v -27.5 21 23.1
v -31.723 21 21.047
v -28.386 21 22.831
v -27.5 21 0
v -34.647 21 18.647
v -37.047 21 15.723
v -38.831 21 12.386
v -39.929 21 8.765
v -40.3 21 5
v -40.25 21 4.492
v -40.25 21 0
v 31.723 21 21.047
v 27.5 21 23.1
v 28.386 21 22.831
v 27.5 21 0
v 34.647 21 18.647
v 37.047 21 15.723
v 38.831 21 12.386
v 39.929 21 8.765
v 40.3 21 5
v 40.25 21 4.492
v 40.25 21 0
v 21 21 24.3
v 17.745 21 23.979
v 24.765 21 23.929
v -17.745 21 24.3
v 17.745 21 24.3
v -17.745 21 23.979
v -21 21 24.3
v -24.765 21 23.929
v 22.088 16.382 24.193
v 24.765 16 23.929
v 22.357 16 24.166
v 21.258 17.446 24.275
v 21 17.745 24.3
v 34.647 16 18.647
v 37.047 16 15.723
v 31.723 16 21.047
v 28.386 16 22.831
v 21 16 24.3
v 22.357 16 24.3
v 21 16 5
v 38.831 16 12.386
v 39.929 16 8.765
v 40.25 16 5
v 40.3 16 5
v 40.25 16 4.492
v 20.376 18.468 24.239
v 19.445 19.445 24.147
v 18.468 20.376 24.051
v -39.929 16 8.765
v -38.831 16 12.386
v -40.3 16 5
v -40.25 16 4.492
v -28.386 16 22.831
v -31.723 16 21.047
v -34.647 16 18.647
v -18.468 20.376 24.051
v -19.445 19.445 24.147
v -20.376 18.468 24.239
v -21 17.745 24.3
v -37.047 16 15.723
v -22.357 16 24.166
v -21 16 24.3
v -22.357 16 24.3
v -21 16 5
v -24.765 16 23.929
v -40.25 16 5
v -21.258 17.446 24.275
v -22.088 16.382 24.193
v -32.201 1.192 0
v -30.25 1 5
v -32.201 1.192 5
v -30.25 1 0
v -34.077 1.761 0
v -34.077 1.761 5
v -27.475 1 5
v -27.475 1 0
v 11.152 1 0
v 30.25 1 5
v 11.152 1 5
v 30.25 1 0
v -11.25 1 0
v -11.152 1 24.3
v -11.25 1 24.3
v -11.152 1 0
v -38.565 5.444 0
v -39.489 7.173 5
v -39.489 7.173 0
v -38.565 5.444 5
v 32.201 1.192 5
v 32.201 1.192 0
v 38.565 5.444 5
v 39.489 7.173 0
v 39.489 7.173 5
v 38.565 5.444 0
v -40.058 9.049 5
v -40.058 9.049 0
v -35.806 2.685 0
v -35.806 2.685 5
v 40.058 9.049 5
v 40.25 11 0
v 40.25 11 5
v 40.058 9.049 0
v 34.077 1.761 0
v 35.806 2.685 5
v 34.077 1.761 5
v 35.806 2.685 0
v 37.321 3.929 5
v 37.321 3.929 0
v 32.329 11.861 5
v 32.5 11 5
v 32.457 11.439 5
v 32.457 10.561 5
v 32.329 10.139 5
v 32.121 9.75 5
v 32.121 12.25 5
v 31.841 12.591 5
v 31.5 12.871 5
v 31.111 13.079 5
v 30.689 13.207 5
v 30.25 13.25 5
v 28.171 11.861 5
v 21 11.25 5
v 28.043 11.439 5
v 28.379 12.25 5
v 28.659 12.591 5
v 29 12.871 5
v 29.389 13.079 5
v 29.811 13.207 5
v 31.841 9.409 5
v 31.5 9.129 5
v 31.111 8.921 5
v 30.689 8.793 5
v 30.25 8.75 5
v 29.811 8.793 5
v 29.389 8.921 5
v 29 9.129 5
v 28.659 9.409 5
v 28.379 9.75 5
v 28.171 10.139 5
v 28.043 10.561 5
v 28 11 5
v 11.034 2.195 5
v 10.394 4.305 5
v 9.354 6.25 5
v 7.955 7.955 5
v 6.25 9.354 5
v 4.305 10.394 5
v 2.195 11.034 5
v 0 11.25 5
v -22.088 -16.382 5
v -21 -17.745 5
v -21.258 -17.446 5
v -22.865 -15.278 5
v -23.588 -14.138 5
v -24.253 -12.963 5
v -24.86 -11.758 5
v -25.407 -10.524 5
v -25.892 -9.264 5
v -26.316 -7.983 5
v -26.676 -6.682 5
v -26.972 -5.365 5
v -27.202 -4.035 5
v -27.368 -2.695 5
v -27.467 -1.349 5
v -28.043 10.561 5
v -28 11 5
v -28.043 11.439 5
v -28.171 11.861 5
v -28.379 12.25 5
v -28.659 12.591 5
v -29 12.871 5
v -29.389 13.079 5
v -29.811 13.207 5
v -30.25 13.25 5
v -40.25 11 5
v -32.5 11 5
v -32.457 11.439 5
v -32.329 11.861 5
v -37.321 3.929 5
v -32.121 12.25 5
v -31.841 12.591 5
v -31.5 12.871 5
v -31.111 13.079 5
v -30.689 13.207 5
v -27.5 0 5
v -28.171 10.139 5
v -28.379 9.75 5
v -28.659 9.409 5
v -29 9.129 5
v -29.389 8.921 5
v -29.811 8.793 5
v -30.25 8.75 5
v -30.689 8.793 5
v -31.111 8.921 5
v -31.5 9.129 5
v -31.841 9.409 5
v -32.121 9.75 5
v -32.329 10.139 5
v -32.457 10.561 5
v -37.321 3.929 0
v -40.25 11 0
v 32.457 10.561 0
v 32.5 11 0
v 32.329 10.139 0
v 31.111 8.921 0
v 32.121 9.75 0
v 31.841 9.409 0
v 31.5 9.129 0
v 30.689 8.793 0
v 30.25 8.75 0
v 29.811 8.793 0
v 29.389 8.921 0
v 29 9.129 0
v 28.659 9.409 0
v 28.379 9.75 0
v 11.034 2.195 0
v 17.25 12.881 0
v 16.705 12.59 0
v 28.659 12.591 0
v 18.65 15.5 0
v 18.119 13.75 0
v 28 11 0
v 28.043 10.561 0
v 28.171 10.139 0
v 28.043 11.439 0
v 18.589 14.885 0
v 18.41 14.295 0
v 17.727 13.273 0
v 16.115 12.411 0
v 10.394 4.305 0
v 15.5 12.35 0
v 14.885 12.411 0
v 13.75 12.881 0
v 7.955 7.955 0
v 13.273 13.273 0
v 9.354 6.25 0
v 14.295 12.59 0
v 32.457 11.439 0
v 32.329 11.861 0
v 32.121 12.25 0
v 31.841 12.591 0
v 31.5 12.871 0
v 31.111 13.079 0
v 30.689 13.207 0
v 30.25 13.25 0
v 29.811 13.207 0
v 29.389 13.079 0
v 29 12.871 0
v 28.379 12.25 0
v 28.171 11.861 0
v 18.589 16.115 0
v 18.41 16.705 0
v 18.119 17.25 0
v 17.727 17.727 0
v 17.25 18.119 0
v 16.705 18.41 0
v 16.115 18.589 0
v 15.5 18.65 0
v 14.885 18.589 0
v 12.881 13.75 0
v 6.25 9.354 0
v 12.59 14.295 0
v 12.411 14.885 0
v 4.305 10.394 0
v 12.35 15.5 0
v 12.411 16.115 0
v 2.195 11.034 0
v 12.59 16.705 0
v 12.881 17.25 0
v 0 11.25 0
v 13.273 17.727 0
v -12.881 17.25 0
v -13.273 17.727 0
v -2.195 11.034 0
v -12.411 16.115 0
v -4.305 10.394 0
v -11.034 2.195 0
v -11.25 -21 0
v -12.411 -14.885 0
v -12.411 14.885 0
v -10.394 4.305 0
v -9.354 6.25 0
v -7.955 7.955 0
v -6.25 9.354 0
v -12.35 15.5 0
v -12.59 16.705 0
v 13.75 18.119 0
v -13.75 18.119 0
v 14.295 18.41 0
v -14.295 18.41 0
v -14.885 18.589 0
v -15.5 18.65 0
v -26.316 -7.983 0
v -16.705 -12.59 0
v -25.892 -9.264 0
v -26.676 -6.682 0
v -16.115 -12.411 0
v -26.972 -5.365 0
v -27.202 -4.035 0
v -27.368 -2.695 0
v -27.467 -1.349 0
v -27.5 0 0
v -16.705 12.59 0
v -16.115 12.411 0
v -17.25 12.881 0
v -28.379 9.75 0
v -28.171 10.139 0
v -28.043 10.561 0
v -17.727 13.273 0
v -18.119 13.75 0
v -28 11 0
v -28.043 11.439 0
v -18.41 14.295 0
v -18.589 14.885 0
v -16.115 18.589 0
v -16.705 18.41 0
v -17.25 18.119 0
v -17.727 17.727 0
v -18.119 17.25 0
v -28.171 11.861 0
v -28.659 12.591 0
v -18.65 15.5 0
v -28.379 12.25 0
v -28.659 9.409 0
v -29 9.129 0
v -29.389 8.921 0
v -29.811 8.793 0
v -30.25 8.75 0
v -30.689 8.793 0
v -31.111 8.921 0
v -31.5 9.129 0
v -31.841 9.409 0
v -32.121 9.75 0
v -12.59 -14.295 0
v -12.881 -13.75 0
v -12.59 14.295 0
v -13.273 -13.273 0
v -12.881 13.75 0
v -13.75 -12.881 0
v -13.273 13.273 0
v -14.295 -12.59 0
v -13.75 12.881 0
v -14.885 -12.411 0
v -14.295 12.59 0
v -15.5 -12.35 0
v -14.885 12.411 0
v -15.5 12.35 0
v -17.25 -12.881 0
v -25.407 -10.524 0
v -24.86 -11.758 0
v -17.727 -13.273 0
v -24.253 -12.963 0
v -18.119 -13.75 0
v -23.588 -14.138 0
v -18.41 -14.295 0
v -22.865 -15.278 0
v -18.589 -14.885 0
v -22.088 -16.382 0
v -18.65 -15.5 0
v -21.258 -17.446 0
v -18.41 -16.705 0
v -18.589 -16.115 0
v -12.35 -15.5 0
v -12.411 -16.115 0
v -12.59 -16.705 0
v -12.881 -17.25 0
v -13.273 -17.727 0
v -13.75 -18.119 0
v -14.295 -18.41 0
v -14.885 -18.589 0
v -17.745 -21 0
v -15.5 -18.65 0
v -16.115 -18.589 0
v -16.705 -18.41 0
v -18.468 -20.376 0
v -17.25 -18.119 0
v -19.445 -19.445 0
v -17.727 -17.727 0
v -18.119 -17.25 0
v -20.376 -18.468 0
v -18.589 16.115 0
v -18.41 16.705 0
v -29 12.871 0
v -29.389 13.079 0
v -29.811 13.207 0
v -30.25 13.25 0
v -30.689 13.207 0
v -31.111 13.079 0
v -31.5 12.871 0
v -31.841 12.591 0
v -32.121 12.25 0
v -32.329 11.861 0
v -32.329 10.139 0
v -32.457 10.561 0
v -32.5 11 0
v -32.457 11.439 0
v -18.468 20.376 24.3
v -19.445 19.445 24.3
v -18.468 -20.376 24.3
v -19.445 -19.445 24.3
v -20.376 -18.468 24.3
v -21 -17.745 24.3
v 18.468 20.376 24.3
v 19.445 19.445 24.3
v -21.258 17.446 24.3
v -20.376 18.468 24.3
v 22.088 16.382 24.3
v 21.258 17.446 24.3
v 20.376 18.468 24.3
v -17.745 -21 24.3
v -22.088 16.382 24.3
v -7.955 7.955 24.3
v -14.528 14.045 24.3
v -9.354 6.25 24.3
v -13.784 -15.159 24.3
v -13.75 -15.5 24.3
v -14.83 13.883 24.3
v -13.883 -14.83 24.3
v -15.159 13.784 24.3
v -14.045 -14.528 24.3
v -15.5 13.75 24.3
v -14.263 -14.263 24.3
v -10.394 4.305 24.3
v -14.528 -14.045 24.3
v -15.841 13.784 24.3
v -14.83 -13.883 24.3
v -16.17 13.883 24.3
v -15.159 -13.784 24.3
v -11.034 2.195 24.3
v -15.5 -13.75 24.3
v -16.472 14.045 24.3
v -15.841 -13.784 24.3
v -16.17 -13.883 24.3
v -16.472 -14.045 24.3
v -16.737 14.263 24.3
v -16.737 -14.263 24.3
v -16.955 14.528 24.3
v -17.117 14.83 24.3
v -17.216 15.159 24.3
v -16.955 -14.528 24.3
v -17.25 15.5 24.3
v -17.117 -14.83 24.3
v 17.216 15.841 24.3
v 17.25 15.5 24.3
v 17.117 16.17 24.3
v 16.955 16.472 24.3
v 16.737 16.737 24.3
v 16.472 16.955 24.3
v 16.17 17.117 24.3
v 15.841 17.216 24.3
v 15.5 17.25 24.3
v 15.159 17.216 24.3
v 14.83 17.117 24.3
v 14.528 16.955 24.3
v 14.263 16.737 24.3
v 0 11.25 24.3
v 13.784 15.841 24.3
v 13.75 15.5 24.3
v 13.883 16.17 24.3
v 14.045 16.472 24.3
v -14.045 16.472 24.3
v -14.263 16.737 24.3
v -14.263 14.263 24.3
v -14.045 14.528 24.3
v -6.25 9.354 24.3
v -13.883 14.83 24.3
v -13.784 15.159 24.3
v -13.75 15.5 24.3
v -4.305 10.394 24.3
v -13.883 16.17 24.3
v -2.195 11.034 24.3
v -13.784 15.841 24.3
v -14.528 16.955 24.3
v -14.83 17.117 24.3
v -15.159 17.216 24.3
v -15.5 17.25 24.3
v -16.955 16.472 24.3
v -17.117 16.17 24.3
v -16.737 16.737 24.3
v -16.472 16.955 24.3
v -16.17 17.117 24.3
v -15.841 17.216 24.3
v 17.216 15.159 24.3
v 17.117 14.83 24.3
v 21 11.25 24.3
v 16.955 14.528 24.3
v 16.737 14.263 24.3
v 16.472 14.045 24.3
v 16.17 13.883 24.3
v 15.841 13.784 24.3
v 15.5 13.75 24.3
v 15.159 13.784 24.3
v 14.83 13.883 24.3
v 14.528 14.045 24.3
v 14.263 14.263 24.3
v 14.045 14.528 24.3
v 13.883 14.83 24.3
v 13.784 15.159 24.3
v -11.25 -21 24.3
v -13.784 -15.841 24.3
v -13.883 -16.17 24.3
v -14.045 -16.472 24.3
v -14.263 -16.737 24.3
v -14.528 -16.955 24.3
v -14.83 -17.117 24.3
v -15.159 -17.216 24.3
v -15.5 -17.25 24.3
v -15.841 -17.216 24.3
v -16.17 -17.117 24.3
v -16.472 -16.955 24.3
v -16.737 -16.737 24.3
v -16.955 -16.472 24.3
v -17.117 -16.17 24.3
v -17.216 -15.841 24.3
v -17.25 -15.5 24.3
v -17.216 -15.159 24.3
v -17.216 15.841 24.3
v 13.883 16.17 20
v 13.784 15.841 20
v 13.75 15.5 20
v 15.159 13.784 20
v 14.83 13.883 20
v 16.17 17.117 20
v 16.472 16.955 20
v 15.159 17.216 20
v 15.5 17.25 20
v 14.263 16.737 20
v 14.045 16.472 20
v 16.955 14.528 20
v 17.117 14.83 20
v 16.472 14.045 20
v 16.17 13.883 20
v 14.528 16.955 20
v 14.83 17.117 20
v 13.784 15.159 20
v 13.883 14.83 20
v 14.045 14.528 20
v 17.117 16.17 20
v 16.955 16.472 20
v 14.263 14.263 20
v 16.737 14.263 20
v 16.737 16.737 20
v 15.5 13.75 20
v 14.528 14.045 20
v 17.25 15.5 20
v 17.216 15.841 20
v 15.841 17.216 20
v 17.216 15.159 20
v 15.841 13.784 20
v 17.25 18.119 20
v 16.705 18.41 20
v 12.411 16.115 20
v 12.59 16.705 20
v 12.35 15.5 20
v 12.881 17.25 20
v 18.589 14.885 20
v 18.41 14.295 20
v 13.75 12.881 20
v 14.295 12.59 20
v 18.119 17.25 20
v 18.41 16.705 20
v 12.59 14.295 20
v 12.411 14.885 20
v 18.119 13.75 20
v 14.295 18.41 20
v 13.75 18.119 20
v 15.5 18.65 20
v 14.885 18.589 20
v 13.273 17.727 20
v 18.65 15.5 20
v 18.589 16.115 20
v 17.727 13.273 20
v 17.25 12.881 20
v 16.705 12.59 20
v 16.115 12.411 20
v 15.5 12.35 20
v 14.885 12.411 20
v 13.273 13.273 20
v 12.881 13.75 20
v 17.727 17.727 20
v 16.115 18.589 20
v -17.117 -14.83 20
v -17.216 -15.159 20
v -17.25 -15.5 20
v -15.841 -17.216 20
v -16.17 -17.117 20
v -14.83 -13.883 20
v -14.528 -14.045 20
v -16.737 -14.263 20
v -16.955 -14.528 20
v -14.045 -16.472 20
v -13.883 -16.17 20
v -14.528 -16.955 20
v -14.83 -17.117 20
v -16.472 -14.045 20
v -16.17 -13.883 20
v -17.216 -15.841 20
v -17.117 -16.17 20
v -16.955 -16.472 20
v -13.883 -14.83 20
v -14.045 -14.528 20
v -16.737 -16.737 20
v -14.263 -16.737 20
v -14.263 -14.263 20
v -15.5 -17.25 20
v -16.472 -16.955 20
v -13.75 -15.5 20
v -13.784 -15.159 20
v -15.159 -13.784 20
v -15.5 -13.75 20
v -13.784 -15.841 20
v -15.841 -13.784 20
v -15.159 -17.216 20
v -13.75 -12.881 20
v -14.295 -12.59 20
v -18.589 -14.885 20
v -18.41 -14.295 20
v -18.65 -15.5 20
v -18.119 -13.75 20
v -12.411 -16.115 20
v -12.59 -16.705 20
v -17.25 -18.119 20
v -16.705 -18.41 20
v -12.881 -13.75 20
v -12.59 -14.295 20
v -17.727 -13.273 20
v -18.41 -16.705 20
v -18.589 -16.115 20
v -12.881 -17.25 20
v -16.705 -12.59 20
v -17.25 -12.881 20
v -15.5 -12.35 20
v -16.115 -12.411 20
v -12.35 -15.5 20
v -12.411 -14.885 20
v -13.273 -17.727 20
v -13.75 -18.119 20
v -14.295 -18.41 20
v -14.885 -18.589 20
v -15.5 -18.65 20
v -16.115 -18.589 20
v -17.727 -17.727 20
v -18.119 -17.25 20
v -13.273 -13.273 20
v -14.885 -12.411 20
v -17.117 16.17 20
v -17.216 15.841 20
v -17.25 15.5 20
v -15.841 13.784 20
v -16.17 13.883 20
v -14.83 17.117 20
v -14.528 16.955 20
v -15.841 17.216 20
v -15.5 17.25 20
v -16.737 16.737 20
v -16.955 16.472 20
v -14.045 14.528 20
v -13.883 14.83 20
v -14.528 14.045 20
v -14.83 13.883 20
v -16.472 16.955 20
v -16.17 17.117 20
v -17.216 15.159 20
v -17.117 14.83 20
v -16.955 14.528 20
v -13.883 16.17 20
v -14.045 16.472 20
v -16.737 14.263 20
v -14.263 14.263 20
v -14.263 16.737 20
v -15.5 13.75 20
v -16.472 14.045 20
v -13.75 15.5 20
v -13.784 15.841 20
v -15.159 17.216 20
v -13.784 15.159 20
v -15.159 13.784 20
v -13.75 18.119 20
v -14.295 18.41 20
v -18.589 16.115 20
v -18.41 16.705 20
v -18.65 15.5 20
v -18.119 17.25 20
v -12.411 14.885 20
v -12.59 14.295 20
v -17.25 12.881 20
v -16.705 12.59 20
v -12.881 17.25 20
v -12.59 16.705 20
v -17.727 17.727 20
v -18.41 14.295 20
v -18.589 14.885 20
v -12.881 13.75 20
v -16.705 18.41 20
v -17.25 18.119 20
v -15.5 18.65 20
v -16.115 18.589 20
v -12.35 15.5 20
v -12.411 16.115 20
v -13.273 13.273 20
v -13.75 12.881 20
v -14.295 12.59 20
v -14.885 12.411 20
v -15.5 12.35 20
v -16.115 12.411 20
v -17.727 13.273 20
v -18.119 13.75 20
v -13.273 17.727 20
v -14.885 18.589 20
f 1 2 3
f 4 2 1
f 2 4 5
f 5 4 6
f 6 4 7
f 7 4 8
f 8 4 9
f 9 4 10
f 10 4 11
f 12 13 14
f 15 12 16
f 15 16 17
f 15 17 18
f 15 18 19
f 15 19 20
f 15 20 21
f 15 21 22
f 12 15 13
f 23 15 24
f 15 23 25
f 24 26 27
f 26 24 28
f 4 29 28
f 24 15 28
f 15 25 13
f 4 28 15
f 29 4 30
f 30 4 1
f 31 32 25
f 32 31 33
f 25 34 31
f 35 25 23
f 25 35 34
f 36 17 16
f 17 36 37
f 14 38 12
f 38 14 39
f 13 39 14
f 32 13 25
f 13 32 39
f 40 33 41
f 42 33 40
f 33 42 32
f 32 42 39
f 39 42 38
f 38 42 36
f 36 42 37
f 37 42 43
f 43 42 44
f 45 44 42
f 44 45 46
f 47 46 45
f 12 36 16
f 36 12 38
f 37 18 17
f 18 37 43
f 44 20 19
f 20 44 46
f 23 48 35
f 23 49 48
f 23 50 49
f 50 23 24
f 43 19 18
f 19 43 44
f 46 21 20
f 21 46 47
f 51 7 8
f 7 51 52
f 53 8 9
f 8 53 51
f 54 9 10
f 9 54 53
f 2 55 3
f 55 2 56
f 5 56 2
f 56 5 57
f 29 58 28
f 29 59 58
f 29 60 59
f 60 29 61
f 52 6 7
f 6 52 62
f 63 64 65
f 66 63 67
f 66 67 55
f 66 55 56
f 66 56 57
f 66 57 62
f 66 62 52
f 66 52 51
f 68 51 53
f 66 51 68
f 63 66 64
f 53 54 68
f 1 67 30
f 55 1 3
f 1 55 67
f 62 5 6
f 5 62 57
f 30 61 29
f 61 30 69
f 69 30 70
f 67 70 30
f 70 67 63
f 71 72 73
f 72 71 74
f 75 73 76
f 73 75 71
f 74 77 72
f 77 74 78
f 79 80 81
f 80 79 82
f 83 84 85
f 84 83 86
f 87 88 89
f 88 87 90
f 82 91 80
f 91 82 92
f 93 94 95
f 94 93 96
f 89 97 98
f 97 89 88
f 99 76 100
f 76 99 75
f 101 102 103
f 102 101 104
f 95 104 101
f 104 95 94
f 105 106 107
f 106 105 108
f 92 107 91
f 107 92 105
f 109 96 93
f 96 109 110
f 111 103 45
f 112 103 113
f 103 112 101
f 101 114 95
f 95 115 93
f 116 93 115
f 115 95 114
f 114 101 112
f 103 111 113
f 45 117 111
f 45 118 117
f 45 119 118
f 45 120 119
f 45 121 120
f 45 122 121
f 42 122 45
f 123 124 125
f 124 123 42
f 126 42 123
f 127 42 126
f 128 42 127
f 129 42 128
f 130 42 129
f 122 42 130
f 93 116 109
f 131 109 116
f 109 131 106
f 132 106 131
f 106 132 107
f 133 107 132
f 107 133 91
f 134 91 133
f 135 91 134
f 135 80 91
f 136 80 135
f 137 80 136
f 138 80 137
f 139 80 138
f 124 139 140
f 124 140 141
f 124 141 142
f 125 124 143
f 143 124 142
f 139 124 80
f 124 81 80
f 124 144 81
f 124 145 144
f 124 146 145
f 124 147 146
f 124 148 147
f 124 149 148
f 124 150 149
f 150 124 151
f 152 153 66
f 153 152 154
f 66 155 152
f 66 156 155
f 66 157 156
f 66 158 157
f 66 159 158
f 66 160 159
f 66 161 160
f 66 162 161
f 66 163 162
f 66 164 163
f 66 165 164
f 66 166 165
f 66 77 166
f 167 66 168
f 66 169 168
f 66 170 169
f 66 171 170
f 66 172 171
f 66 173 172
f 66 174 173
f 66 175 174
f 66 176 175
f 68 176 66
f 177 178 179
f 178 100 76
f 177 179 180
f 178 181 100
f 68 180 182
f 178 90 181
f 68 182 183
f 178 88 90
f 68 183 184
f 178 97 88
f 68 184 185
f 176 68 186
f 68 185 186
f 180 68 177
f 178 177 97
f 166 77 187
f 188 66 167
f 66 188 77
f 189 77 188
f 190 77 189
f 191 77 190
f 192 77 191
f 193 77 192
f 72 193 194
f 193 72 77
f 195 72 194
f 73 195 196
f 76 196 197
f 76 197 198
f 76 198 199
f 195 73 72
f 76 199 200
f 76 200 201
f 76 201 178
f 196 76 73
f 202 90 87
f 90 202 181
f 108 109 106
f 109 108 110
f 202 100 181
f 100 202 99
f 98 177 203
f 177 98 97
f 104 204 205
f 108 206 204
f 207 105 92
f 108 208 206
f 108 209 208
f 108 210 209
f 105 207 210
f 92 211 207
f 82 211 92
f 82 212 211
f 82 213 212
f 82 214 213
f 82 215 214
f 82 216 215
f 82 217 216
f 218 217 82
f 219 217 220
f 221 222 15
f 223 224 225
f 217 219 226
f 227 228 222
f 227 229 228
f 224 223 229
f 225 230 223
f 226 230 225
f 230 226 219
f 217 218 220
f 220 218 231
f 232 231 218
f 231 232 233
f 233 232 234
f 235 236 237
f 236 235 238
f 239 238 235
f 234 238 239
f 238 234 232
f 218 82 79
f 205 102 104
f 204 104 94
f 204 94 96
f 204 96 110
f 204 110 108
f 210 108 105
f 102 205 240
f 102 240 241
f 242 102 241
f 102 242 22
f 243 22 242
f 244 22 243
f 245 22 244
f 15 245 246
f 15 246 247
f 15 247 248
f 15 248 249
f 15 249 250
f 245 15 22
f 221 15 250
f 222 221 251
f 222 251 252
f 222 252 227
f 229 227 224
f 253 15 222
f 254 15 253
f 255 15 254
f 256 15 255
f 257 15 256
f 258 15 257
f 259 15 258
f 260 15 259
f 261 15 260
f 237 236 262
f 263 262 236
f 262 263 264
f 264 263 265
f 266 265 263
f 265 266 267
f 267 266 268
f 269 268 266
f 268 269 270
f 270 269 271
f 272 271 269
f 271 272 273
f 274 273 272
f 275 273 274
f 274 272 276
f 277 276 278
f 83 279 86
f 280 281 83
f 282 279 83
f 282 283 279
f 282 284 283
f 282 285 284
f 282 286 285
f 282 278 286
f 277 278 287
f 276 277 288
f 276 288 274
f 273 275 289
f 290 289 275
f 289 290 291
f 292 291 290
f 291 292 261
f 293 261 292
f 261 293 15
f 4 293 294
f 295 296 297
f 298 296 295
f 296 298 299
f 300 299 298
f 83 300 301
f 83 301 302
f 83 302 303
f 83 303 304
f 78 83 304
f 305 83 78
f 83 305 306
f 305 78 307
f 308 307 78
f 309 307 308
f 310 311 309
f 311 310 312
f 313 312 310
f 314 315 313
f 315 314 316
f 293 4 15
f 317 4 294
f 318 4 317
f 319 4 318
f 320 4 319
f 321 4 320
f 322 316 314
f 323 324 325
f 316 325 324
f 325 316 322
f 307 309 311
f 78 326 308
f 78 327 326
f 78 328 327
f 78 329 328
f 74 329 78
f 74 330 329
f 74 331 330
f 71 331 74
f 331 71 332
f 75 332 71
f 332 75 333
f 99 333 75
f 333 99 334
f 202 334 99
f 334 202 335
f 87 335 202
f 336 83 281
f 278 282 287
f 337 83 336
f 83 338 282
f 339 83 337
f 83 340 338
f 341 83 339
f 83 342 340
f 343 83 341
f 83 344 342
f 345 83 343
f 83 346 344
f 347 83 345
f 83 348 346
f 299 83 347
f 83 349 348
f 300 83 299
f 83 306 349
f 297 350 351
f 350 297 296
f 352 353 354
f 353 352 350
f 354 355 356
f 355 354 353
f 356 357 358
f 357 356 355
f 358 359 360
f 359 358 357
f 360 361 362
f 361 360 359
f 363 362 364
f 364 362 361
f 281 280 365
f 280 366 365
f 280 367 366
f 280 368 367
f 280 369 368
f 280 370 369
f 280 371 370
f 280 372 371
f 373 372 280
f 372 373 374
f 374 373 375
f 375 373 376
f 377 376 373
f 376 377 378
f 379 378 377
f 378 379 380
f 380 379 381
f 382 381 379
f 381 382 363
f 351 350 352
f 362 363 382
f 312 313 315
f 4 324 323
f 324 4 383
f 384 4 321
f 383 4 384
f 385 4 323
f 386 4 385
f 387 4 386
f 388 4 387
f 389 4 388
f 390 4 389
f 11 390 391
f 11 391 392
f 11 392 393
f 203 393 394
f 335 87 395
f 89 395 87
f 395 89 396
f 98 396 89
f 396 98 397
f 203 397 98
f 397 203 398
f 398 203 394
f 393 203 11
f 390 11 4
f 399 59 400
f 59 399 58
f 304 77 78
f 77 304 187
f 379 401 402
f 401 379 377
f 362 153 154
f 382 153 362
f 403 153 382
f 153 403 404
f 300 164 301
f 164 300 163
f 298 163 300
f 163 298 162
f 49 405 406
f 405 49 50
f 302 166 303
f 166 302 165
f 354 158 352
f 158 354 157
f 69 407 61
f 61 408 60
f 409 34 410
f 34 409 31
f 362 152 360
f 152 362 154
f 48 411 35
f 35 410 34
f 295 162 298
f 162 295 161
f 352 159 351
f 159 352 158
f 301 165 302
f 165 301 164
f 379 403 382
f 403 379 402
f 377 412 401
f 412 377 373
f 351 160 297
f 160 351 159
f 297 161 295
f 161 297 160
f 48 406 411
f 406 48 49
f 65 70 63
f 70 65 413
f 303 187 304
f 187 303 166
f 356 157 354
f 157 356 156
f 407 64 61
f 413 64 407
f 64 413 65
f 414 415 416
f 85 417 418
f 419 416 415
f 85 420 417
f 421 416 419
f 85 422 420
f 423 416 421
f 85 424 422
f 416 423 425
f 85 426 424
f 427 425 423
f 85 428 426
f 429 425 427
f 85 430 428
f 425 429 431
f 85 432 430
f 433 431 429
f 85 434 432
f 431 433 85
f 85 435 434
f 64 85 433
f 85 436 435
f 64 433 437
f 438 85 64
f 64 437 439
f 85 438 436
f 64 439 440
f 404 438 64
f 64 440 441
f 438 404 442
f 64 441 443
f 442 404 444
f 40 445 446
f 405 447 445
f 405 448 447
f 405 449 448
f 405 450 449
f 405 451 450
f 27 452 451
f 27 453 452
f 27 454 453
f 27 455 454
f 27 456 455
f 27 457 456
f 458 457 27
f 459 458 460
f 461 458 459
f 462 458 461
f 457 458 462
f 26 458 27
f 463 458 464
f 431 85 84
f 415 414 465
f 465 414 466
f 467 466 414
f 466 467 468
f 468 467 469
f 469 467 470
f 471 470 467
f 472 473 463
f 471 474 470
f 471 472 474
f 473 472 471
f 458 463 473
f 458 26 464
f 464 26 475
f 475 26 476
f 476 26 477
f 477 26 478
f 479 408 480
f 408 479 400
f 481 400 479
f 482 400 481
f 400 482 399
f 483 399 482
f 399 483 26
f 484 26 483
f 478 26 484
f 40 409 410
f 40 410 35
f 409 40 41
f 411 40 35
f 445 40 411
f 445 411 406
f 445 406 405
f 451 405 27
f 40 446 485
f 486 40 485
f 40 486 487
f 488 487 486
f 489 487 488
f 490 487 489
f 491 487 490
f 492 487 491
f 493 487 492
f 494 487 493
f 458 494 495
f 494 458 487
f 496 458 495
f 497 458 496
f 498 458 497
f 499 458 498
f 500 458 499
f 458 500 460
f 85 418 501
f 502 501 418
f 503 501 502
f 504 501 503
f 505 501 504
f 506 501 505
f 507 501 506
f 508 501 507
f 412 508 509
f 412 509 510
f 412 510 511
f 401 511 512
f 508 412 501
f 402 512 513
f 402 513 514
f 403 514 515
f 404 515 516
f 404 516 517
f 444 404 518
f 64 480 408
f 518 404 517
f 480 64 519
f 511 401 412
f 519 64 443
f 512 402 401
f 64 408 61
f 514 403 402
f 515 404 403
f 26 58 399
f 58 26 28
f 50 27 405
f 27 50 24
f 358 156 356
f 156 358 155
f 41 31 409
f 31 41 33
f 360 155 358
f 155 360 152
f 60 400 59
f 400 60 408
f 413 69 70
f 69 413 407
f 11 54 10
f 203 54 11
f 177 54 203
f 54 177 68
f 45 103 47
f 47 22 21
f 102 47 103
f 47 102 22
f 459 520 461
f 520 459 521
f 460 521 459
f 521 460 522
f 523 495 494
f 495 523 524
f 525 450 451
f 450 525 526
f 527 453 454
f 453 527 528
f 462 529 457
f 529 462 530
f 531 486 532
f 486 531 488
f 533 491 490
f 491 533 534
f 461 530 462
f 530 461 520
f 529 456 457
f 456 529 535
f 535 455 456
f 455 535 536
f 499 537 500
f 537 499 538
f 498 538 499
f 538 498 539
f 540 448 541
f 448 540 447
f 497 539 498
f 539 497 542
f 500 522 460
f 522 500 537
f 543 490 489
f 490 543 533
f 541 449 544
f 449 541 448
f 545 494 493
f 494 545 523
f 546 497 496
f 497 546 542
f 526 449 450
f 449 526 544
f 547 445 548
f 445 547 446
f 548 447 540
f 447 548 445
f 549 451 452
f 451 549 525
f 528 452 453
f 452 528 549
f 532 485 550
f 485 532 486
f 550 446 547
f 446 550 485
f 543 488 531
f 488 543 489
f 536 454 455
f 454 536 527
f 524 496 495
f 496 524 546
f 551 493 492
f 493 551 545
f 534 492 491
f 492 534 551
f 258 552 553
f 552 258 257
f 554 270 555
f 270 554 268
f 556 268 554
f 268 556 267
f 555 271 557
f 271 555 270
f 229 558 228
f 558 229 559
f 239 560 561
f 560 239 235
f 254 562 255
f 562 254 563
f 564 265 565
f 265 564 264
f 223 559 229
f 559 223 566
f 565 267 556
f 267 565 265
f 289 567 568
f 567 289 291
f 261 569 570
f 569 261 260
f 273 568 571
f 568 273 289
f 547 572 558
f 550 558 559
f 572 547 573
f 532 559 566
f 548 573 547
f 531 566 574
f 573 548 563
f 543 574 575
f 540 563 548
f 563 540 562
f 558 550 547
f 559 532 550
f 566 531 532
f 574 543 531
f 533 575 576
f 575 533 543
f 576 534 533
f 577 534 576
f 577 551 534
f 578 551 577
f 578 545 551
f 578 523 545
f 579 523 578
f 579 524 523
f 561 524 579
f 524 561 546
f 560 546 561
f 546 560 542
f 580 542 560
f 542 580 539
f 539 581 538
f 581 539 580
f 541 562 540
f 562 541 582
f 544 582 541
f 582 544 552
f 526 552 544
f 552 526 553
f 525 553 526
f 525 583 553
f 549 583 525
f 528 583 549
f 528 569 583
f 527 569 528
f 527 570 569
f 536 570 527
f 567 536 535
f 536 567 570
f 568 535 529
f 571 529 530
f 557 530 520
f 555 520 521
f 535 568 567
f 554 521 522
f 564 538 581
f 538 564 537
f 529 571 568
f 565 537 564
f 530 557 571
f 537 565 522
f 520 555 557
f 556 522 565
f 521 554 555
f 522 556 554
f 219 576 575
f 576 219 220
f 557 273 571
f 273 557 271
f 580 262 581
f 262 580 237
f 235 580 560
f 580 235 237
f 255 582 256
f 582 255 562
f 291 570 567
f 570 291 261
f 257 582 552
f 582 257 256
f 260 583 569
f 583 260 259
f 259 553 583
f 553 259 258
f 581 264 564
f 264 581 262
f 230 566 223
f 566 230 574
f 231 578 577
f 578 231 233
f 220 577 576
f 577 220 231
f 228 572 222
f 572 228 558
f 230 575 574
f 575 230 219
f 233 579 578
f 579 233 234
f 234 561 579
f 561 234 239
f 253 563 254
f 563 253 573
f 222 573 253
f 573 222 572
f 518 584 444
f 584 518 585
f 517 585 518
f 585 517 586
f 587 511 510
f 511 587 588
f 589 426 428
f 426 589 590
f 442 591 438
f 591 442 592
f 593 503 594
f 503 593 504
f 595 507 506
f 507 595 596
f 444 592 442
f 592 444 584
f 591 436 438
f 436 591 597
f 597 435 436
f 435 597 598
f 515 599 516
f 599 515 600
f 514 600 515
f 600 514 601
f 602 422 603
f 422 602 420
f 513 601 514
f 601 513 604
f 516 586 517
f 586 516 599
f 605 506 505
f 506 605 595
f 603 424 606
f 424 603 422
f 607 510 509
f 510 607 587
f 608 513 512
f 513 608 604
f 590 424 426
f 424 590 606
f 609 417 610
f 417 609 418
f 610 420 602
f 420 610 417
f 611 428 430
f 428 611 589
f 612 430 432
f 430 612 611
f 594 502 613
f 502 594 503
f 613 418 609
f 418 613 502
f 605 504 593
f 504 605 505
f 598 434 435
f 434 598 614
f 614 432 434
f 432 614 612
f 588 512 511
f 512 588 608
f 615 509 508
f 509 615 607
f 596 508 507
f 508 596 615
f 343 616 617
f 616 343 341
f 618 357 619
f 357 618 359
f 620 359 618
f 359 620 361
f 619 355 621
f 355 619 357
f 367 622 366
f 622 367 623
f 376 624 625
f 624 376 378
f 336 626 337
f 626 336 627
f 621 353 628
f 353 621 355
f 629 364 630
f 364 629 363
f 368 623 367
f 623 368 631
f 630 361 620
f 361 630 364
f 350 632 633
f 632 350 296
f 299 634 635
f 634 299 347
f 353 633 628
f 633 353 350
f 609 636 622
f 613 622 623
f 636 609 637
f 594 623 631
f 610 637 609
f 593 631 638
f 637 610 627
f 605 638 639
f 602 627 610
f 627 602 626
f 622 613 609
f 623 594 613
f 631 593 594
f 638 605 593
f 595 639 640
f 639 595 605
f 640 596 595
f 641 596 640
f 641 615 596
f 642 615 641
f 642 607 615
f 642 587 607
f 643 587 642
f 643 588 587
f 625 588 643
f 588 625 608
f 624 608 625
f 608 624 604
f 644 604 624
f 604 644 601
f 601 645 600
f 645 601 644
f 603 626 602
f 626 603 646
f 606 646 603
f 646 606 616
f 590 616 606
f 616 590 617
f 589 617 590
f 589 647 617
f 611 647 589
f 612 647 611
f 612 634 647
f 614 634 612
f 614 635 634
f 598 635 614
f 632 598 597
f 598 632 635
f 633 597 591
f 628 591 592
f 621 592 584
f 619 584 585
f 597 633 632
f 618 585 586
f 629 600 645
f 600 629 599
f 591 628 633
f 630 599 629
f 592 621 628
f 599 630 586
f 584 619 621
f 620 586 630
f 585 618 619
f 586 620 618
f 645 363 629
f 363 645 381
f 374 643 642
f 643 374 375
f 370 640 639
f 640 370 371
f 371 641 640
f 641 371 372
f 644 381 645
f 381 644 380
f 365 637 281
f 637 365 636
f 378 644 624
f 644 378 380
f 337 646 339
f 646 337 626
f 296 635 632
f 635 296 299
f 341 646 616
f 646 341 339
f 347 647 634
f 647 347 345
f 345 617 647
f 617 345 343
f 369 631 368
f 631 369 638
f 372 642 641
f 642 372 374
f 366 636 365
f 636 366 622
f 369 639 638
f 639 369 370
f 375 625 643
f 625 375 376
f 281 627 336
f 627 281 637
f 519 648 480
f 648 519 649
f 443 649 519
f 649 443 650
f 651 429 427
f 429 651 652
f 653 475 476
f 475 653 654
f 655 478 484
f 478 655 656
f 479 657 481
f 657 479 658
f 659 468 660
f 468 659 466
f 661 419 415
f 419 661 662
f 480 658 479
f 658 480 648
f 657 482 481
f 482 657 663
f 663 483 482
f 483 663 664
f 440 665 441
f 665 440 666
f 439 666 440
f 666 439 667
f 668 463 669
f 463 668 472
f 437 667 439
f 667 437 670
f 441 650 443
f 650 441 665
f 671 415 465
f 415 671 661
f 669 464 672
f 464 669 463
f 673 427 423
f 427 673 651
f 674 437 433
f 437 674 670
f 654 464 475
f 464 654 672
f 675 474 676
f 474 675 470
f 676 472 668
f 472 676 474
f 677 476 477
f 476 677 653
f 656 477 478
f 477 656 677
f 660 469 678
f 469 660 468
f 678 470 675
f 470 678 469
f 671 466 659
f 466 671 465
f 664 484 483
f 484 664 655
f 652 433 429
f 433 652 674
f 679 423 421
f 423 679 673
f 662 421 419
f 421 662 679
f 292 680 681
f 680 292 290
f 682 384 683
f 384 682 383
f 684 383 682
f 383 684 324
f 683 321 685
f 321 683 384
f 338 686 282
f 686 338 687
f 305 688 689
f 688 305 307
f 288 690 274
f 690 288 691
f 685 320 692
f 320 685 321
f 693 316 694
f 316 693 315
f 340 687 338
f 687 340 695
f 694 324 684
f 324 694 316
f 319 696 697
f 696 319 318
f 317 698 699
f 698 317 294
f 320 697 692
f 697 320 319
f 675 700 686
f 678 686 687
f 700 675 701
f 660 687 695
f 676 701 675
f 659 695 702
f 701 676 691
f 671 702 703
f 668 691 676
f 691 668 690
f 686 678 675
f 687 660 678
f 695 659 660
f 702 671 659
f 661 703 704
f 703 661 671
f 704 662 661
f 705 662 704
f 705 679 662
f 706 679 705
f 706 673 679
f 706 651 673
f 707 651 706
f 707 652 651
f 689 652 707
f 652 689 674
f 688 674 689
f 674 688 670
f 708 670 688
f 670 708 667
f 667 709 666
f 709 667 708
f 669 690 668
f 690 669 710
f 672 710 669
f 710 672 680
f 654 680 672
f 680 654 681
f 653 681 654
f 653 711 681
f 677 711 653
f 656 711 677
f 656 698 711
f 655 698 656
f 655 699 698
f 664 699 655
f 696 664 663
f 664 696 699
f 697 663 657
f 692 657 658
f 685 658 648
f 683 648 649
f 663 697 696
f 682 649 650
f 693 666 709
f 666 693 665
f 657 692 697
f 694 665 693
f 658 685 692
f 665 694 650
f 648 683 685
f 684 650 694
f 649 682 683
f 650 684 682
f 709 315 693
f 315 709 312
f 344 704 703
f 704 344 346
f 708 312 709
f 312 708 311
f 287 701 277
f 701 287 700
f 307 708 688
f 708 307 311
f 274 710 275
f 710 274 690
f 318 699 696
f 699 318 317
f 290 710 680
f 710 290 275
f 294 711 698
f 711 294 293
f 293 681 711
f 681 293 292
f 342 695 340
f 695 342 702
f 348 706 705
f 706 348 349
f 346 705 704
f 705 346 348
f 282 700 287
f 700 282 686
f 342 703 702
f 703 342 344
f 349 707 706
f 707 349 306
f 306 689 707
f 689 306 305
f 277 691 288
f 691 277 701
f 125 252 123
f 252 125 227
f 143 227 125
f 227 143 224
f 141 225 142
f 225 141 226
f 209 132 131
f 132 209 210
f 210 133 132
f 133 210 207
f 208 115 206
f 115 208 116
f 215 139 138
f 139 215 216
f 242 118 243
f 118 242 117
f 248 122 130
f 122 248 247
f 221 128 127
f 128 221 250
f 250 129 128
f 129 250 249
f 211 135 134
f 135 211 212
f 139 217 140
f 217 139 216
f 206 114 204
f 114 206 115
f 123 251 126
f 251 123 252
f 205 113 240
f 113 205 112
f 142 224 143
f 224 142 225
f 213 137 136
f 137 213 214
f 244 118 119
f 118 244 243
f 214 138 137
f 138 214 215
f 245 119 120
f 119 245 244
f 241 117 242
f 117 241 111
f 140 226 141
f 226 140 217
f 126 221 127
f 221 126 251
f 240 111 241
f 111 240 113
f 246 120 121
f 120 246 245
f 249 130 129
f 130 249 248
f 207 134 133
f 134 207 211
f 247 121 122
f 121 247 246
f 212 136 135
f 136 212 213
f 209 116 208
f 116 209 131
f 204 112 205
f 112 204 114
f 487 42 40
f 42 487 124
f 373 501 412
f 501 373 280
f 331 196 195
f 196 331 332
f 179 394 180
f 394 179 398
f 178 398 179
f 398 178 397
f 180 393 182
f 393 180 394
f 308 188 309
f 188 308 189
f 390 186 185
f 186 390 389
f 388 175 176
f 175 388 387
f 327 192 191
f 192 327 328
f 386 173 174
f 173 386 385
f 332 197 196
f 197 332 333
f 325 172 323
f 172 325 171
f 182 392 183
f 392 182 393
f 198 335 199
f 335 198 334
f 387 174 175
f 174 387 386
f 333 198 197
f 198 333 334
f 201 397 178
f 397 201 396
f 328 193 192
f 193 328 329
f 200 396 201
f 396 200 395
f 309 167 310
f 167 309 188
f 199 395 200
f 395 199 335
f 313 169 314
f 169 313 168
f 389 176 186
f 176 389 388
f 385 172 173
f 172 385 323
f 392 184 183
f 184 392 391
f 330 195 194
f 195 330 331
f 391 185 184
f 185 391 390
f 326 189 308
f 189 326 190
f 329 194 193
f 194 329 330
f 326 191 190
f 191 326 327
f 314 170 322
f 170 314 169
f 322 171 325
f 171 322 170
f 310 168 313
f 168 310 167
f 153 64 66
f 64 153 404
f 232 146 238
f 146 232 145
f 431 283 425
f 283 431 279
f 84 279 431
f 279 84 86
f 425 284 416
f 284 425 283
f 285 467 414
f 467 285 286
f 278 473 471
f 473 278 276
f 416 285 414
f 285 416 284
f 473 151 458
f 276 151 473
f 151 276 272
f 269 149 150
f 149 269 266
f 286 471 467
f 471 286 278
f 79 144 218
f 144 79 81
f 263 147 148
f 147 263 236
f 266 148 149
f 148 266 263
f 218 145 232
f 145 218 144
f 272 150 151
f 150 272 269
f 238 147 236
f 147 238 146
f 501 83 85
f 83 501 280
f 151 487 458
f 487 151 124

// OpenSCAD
res = 32;

module Xmotor_holder() {
    render(convexity=6) difference() {
        union() {
            hull() {
                for(i=[-1, 1]) {
                    translate([i*30.25, 11, 0]) cylinder(d=20, h=5, $fn=res);
                }
            }
            cylinder(d=55, h=24.3, $fn=4*res);
            translate([-40.25, 11, 0]) cube([80.5, 10, 5]);
            for(i=[-1, 1]) {
                translate([i*21, 21, 5]) rotate([90, 0, 0]) cylinder(d=38.6, h=5, $fn=res);
            }
        }
        translate([0, 0, -1]) cylinder(d=22.5, h=41, $fn=res);
        for(i=[-1, 1]) {
            translate([i*30.25, 11, -1]) cylinder(d=4.5, h=7, $fn=res);
            for(j=[-1, 1]) {
                translate([i*15.5, j*15.5, -1]) {
                    cylinder(d=3.5, h=41, $fn=res);
                    cylinder(d=6.3, h=21, $fn=res);
                }
            }
            translate([i*48.5, -6.5-5, 18]) cube([55, 55, 26], center=true);
            translate([0, i*48.5, 12]) cube([55, 55, 26], center=true);
        }
        translate([-50+11.25, -49, -1]) cube([50, 50, 50]);
        translate([-50, -49+10.25, 5]) cube([50, 50, 50]);
        translate([-100, -100, -50]) cube([200, 200, 50]);
    }
}

module Ymotor_holder() {
    mirror([1,0,0]) Xmotor_holder();
}

module Zmotor_holder() {
    render(convexity=6) difference() {
        union() {
            hull() {
                for(i=[-1, 1]) {
                    translate([i*30.25, 11, 0]) cylinder(d=20, h=5, $fn=res);
                }
            }
            cylinder(d=55, h=24.3+0.5, $fn=4*res);
            translate([-40.25, 11, 0]) cube([80.5, 10, 5]);
            for(i=[-1, 1]) {
                translate([i*21, 21, 5]) rotate([90, 0, 0]) cylinder(d=38.6, h=5, $fn=res);
            }
        }
        translate([0, 0, -1]) cylinder(d=22.5, h=41, $fn=res);
        for(i=[-1, 1]) {
            translate([i*30.25, 11, -1]) cylinder(d=4.5, h=7, $fn=res);
            for(j=[-1, 1]) {
                translate([i*15.5, j*15.5, -1]) {
                    cylinder(d=3.5, h=41, $fn=res);
                    cylinder(d=6.3, h=21, $fn=res);
                }
            }
            translate([i*48.5, -6.5-5, 18]) cube([55, 55, 26], center=true);
            translate([0, i*48.5, 12]) cube([55, 55, 26], center=true);
        }
        translate([-50+11.25, -49, -1]) cube([50, 50, 50]);
        translate([-50, -49+10.25, 5]) cube([50, 50, 50]);
        translate([-100, -100, -50]) cube([200, 200, 50]);
    }
}

//translate([0, 0, 41]) rotate([180, 0, 0]) color("Blue") import("Motor_NEMA17.stl", convexity=6);
Ymotor_holder();
